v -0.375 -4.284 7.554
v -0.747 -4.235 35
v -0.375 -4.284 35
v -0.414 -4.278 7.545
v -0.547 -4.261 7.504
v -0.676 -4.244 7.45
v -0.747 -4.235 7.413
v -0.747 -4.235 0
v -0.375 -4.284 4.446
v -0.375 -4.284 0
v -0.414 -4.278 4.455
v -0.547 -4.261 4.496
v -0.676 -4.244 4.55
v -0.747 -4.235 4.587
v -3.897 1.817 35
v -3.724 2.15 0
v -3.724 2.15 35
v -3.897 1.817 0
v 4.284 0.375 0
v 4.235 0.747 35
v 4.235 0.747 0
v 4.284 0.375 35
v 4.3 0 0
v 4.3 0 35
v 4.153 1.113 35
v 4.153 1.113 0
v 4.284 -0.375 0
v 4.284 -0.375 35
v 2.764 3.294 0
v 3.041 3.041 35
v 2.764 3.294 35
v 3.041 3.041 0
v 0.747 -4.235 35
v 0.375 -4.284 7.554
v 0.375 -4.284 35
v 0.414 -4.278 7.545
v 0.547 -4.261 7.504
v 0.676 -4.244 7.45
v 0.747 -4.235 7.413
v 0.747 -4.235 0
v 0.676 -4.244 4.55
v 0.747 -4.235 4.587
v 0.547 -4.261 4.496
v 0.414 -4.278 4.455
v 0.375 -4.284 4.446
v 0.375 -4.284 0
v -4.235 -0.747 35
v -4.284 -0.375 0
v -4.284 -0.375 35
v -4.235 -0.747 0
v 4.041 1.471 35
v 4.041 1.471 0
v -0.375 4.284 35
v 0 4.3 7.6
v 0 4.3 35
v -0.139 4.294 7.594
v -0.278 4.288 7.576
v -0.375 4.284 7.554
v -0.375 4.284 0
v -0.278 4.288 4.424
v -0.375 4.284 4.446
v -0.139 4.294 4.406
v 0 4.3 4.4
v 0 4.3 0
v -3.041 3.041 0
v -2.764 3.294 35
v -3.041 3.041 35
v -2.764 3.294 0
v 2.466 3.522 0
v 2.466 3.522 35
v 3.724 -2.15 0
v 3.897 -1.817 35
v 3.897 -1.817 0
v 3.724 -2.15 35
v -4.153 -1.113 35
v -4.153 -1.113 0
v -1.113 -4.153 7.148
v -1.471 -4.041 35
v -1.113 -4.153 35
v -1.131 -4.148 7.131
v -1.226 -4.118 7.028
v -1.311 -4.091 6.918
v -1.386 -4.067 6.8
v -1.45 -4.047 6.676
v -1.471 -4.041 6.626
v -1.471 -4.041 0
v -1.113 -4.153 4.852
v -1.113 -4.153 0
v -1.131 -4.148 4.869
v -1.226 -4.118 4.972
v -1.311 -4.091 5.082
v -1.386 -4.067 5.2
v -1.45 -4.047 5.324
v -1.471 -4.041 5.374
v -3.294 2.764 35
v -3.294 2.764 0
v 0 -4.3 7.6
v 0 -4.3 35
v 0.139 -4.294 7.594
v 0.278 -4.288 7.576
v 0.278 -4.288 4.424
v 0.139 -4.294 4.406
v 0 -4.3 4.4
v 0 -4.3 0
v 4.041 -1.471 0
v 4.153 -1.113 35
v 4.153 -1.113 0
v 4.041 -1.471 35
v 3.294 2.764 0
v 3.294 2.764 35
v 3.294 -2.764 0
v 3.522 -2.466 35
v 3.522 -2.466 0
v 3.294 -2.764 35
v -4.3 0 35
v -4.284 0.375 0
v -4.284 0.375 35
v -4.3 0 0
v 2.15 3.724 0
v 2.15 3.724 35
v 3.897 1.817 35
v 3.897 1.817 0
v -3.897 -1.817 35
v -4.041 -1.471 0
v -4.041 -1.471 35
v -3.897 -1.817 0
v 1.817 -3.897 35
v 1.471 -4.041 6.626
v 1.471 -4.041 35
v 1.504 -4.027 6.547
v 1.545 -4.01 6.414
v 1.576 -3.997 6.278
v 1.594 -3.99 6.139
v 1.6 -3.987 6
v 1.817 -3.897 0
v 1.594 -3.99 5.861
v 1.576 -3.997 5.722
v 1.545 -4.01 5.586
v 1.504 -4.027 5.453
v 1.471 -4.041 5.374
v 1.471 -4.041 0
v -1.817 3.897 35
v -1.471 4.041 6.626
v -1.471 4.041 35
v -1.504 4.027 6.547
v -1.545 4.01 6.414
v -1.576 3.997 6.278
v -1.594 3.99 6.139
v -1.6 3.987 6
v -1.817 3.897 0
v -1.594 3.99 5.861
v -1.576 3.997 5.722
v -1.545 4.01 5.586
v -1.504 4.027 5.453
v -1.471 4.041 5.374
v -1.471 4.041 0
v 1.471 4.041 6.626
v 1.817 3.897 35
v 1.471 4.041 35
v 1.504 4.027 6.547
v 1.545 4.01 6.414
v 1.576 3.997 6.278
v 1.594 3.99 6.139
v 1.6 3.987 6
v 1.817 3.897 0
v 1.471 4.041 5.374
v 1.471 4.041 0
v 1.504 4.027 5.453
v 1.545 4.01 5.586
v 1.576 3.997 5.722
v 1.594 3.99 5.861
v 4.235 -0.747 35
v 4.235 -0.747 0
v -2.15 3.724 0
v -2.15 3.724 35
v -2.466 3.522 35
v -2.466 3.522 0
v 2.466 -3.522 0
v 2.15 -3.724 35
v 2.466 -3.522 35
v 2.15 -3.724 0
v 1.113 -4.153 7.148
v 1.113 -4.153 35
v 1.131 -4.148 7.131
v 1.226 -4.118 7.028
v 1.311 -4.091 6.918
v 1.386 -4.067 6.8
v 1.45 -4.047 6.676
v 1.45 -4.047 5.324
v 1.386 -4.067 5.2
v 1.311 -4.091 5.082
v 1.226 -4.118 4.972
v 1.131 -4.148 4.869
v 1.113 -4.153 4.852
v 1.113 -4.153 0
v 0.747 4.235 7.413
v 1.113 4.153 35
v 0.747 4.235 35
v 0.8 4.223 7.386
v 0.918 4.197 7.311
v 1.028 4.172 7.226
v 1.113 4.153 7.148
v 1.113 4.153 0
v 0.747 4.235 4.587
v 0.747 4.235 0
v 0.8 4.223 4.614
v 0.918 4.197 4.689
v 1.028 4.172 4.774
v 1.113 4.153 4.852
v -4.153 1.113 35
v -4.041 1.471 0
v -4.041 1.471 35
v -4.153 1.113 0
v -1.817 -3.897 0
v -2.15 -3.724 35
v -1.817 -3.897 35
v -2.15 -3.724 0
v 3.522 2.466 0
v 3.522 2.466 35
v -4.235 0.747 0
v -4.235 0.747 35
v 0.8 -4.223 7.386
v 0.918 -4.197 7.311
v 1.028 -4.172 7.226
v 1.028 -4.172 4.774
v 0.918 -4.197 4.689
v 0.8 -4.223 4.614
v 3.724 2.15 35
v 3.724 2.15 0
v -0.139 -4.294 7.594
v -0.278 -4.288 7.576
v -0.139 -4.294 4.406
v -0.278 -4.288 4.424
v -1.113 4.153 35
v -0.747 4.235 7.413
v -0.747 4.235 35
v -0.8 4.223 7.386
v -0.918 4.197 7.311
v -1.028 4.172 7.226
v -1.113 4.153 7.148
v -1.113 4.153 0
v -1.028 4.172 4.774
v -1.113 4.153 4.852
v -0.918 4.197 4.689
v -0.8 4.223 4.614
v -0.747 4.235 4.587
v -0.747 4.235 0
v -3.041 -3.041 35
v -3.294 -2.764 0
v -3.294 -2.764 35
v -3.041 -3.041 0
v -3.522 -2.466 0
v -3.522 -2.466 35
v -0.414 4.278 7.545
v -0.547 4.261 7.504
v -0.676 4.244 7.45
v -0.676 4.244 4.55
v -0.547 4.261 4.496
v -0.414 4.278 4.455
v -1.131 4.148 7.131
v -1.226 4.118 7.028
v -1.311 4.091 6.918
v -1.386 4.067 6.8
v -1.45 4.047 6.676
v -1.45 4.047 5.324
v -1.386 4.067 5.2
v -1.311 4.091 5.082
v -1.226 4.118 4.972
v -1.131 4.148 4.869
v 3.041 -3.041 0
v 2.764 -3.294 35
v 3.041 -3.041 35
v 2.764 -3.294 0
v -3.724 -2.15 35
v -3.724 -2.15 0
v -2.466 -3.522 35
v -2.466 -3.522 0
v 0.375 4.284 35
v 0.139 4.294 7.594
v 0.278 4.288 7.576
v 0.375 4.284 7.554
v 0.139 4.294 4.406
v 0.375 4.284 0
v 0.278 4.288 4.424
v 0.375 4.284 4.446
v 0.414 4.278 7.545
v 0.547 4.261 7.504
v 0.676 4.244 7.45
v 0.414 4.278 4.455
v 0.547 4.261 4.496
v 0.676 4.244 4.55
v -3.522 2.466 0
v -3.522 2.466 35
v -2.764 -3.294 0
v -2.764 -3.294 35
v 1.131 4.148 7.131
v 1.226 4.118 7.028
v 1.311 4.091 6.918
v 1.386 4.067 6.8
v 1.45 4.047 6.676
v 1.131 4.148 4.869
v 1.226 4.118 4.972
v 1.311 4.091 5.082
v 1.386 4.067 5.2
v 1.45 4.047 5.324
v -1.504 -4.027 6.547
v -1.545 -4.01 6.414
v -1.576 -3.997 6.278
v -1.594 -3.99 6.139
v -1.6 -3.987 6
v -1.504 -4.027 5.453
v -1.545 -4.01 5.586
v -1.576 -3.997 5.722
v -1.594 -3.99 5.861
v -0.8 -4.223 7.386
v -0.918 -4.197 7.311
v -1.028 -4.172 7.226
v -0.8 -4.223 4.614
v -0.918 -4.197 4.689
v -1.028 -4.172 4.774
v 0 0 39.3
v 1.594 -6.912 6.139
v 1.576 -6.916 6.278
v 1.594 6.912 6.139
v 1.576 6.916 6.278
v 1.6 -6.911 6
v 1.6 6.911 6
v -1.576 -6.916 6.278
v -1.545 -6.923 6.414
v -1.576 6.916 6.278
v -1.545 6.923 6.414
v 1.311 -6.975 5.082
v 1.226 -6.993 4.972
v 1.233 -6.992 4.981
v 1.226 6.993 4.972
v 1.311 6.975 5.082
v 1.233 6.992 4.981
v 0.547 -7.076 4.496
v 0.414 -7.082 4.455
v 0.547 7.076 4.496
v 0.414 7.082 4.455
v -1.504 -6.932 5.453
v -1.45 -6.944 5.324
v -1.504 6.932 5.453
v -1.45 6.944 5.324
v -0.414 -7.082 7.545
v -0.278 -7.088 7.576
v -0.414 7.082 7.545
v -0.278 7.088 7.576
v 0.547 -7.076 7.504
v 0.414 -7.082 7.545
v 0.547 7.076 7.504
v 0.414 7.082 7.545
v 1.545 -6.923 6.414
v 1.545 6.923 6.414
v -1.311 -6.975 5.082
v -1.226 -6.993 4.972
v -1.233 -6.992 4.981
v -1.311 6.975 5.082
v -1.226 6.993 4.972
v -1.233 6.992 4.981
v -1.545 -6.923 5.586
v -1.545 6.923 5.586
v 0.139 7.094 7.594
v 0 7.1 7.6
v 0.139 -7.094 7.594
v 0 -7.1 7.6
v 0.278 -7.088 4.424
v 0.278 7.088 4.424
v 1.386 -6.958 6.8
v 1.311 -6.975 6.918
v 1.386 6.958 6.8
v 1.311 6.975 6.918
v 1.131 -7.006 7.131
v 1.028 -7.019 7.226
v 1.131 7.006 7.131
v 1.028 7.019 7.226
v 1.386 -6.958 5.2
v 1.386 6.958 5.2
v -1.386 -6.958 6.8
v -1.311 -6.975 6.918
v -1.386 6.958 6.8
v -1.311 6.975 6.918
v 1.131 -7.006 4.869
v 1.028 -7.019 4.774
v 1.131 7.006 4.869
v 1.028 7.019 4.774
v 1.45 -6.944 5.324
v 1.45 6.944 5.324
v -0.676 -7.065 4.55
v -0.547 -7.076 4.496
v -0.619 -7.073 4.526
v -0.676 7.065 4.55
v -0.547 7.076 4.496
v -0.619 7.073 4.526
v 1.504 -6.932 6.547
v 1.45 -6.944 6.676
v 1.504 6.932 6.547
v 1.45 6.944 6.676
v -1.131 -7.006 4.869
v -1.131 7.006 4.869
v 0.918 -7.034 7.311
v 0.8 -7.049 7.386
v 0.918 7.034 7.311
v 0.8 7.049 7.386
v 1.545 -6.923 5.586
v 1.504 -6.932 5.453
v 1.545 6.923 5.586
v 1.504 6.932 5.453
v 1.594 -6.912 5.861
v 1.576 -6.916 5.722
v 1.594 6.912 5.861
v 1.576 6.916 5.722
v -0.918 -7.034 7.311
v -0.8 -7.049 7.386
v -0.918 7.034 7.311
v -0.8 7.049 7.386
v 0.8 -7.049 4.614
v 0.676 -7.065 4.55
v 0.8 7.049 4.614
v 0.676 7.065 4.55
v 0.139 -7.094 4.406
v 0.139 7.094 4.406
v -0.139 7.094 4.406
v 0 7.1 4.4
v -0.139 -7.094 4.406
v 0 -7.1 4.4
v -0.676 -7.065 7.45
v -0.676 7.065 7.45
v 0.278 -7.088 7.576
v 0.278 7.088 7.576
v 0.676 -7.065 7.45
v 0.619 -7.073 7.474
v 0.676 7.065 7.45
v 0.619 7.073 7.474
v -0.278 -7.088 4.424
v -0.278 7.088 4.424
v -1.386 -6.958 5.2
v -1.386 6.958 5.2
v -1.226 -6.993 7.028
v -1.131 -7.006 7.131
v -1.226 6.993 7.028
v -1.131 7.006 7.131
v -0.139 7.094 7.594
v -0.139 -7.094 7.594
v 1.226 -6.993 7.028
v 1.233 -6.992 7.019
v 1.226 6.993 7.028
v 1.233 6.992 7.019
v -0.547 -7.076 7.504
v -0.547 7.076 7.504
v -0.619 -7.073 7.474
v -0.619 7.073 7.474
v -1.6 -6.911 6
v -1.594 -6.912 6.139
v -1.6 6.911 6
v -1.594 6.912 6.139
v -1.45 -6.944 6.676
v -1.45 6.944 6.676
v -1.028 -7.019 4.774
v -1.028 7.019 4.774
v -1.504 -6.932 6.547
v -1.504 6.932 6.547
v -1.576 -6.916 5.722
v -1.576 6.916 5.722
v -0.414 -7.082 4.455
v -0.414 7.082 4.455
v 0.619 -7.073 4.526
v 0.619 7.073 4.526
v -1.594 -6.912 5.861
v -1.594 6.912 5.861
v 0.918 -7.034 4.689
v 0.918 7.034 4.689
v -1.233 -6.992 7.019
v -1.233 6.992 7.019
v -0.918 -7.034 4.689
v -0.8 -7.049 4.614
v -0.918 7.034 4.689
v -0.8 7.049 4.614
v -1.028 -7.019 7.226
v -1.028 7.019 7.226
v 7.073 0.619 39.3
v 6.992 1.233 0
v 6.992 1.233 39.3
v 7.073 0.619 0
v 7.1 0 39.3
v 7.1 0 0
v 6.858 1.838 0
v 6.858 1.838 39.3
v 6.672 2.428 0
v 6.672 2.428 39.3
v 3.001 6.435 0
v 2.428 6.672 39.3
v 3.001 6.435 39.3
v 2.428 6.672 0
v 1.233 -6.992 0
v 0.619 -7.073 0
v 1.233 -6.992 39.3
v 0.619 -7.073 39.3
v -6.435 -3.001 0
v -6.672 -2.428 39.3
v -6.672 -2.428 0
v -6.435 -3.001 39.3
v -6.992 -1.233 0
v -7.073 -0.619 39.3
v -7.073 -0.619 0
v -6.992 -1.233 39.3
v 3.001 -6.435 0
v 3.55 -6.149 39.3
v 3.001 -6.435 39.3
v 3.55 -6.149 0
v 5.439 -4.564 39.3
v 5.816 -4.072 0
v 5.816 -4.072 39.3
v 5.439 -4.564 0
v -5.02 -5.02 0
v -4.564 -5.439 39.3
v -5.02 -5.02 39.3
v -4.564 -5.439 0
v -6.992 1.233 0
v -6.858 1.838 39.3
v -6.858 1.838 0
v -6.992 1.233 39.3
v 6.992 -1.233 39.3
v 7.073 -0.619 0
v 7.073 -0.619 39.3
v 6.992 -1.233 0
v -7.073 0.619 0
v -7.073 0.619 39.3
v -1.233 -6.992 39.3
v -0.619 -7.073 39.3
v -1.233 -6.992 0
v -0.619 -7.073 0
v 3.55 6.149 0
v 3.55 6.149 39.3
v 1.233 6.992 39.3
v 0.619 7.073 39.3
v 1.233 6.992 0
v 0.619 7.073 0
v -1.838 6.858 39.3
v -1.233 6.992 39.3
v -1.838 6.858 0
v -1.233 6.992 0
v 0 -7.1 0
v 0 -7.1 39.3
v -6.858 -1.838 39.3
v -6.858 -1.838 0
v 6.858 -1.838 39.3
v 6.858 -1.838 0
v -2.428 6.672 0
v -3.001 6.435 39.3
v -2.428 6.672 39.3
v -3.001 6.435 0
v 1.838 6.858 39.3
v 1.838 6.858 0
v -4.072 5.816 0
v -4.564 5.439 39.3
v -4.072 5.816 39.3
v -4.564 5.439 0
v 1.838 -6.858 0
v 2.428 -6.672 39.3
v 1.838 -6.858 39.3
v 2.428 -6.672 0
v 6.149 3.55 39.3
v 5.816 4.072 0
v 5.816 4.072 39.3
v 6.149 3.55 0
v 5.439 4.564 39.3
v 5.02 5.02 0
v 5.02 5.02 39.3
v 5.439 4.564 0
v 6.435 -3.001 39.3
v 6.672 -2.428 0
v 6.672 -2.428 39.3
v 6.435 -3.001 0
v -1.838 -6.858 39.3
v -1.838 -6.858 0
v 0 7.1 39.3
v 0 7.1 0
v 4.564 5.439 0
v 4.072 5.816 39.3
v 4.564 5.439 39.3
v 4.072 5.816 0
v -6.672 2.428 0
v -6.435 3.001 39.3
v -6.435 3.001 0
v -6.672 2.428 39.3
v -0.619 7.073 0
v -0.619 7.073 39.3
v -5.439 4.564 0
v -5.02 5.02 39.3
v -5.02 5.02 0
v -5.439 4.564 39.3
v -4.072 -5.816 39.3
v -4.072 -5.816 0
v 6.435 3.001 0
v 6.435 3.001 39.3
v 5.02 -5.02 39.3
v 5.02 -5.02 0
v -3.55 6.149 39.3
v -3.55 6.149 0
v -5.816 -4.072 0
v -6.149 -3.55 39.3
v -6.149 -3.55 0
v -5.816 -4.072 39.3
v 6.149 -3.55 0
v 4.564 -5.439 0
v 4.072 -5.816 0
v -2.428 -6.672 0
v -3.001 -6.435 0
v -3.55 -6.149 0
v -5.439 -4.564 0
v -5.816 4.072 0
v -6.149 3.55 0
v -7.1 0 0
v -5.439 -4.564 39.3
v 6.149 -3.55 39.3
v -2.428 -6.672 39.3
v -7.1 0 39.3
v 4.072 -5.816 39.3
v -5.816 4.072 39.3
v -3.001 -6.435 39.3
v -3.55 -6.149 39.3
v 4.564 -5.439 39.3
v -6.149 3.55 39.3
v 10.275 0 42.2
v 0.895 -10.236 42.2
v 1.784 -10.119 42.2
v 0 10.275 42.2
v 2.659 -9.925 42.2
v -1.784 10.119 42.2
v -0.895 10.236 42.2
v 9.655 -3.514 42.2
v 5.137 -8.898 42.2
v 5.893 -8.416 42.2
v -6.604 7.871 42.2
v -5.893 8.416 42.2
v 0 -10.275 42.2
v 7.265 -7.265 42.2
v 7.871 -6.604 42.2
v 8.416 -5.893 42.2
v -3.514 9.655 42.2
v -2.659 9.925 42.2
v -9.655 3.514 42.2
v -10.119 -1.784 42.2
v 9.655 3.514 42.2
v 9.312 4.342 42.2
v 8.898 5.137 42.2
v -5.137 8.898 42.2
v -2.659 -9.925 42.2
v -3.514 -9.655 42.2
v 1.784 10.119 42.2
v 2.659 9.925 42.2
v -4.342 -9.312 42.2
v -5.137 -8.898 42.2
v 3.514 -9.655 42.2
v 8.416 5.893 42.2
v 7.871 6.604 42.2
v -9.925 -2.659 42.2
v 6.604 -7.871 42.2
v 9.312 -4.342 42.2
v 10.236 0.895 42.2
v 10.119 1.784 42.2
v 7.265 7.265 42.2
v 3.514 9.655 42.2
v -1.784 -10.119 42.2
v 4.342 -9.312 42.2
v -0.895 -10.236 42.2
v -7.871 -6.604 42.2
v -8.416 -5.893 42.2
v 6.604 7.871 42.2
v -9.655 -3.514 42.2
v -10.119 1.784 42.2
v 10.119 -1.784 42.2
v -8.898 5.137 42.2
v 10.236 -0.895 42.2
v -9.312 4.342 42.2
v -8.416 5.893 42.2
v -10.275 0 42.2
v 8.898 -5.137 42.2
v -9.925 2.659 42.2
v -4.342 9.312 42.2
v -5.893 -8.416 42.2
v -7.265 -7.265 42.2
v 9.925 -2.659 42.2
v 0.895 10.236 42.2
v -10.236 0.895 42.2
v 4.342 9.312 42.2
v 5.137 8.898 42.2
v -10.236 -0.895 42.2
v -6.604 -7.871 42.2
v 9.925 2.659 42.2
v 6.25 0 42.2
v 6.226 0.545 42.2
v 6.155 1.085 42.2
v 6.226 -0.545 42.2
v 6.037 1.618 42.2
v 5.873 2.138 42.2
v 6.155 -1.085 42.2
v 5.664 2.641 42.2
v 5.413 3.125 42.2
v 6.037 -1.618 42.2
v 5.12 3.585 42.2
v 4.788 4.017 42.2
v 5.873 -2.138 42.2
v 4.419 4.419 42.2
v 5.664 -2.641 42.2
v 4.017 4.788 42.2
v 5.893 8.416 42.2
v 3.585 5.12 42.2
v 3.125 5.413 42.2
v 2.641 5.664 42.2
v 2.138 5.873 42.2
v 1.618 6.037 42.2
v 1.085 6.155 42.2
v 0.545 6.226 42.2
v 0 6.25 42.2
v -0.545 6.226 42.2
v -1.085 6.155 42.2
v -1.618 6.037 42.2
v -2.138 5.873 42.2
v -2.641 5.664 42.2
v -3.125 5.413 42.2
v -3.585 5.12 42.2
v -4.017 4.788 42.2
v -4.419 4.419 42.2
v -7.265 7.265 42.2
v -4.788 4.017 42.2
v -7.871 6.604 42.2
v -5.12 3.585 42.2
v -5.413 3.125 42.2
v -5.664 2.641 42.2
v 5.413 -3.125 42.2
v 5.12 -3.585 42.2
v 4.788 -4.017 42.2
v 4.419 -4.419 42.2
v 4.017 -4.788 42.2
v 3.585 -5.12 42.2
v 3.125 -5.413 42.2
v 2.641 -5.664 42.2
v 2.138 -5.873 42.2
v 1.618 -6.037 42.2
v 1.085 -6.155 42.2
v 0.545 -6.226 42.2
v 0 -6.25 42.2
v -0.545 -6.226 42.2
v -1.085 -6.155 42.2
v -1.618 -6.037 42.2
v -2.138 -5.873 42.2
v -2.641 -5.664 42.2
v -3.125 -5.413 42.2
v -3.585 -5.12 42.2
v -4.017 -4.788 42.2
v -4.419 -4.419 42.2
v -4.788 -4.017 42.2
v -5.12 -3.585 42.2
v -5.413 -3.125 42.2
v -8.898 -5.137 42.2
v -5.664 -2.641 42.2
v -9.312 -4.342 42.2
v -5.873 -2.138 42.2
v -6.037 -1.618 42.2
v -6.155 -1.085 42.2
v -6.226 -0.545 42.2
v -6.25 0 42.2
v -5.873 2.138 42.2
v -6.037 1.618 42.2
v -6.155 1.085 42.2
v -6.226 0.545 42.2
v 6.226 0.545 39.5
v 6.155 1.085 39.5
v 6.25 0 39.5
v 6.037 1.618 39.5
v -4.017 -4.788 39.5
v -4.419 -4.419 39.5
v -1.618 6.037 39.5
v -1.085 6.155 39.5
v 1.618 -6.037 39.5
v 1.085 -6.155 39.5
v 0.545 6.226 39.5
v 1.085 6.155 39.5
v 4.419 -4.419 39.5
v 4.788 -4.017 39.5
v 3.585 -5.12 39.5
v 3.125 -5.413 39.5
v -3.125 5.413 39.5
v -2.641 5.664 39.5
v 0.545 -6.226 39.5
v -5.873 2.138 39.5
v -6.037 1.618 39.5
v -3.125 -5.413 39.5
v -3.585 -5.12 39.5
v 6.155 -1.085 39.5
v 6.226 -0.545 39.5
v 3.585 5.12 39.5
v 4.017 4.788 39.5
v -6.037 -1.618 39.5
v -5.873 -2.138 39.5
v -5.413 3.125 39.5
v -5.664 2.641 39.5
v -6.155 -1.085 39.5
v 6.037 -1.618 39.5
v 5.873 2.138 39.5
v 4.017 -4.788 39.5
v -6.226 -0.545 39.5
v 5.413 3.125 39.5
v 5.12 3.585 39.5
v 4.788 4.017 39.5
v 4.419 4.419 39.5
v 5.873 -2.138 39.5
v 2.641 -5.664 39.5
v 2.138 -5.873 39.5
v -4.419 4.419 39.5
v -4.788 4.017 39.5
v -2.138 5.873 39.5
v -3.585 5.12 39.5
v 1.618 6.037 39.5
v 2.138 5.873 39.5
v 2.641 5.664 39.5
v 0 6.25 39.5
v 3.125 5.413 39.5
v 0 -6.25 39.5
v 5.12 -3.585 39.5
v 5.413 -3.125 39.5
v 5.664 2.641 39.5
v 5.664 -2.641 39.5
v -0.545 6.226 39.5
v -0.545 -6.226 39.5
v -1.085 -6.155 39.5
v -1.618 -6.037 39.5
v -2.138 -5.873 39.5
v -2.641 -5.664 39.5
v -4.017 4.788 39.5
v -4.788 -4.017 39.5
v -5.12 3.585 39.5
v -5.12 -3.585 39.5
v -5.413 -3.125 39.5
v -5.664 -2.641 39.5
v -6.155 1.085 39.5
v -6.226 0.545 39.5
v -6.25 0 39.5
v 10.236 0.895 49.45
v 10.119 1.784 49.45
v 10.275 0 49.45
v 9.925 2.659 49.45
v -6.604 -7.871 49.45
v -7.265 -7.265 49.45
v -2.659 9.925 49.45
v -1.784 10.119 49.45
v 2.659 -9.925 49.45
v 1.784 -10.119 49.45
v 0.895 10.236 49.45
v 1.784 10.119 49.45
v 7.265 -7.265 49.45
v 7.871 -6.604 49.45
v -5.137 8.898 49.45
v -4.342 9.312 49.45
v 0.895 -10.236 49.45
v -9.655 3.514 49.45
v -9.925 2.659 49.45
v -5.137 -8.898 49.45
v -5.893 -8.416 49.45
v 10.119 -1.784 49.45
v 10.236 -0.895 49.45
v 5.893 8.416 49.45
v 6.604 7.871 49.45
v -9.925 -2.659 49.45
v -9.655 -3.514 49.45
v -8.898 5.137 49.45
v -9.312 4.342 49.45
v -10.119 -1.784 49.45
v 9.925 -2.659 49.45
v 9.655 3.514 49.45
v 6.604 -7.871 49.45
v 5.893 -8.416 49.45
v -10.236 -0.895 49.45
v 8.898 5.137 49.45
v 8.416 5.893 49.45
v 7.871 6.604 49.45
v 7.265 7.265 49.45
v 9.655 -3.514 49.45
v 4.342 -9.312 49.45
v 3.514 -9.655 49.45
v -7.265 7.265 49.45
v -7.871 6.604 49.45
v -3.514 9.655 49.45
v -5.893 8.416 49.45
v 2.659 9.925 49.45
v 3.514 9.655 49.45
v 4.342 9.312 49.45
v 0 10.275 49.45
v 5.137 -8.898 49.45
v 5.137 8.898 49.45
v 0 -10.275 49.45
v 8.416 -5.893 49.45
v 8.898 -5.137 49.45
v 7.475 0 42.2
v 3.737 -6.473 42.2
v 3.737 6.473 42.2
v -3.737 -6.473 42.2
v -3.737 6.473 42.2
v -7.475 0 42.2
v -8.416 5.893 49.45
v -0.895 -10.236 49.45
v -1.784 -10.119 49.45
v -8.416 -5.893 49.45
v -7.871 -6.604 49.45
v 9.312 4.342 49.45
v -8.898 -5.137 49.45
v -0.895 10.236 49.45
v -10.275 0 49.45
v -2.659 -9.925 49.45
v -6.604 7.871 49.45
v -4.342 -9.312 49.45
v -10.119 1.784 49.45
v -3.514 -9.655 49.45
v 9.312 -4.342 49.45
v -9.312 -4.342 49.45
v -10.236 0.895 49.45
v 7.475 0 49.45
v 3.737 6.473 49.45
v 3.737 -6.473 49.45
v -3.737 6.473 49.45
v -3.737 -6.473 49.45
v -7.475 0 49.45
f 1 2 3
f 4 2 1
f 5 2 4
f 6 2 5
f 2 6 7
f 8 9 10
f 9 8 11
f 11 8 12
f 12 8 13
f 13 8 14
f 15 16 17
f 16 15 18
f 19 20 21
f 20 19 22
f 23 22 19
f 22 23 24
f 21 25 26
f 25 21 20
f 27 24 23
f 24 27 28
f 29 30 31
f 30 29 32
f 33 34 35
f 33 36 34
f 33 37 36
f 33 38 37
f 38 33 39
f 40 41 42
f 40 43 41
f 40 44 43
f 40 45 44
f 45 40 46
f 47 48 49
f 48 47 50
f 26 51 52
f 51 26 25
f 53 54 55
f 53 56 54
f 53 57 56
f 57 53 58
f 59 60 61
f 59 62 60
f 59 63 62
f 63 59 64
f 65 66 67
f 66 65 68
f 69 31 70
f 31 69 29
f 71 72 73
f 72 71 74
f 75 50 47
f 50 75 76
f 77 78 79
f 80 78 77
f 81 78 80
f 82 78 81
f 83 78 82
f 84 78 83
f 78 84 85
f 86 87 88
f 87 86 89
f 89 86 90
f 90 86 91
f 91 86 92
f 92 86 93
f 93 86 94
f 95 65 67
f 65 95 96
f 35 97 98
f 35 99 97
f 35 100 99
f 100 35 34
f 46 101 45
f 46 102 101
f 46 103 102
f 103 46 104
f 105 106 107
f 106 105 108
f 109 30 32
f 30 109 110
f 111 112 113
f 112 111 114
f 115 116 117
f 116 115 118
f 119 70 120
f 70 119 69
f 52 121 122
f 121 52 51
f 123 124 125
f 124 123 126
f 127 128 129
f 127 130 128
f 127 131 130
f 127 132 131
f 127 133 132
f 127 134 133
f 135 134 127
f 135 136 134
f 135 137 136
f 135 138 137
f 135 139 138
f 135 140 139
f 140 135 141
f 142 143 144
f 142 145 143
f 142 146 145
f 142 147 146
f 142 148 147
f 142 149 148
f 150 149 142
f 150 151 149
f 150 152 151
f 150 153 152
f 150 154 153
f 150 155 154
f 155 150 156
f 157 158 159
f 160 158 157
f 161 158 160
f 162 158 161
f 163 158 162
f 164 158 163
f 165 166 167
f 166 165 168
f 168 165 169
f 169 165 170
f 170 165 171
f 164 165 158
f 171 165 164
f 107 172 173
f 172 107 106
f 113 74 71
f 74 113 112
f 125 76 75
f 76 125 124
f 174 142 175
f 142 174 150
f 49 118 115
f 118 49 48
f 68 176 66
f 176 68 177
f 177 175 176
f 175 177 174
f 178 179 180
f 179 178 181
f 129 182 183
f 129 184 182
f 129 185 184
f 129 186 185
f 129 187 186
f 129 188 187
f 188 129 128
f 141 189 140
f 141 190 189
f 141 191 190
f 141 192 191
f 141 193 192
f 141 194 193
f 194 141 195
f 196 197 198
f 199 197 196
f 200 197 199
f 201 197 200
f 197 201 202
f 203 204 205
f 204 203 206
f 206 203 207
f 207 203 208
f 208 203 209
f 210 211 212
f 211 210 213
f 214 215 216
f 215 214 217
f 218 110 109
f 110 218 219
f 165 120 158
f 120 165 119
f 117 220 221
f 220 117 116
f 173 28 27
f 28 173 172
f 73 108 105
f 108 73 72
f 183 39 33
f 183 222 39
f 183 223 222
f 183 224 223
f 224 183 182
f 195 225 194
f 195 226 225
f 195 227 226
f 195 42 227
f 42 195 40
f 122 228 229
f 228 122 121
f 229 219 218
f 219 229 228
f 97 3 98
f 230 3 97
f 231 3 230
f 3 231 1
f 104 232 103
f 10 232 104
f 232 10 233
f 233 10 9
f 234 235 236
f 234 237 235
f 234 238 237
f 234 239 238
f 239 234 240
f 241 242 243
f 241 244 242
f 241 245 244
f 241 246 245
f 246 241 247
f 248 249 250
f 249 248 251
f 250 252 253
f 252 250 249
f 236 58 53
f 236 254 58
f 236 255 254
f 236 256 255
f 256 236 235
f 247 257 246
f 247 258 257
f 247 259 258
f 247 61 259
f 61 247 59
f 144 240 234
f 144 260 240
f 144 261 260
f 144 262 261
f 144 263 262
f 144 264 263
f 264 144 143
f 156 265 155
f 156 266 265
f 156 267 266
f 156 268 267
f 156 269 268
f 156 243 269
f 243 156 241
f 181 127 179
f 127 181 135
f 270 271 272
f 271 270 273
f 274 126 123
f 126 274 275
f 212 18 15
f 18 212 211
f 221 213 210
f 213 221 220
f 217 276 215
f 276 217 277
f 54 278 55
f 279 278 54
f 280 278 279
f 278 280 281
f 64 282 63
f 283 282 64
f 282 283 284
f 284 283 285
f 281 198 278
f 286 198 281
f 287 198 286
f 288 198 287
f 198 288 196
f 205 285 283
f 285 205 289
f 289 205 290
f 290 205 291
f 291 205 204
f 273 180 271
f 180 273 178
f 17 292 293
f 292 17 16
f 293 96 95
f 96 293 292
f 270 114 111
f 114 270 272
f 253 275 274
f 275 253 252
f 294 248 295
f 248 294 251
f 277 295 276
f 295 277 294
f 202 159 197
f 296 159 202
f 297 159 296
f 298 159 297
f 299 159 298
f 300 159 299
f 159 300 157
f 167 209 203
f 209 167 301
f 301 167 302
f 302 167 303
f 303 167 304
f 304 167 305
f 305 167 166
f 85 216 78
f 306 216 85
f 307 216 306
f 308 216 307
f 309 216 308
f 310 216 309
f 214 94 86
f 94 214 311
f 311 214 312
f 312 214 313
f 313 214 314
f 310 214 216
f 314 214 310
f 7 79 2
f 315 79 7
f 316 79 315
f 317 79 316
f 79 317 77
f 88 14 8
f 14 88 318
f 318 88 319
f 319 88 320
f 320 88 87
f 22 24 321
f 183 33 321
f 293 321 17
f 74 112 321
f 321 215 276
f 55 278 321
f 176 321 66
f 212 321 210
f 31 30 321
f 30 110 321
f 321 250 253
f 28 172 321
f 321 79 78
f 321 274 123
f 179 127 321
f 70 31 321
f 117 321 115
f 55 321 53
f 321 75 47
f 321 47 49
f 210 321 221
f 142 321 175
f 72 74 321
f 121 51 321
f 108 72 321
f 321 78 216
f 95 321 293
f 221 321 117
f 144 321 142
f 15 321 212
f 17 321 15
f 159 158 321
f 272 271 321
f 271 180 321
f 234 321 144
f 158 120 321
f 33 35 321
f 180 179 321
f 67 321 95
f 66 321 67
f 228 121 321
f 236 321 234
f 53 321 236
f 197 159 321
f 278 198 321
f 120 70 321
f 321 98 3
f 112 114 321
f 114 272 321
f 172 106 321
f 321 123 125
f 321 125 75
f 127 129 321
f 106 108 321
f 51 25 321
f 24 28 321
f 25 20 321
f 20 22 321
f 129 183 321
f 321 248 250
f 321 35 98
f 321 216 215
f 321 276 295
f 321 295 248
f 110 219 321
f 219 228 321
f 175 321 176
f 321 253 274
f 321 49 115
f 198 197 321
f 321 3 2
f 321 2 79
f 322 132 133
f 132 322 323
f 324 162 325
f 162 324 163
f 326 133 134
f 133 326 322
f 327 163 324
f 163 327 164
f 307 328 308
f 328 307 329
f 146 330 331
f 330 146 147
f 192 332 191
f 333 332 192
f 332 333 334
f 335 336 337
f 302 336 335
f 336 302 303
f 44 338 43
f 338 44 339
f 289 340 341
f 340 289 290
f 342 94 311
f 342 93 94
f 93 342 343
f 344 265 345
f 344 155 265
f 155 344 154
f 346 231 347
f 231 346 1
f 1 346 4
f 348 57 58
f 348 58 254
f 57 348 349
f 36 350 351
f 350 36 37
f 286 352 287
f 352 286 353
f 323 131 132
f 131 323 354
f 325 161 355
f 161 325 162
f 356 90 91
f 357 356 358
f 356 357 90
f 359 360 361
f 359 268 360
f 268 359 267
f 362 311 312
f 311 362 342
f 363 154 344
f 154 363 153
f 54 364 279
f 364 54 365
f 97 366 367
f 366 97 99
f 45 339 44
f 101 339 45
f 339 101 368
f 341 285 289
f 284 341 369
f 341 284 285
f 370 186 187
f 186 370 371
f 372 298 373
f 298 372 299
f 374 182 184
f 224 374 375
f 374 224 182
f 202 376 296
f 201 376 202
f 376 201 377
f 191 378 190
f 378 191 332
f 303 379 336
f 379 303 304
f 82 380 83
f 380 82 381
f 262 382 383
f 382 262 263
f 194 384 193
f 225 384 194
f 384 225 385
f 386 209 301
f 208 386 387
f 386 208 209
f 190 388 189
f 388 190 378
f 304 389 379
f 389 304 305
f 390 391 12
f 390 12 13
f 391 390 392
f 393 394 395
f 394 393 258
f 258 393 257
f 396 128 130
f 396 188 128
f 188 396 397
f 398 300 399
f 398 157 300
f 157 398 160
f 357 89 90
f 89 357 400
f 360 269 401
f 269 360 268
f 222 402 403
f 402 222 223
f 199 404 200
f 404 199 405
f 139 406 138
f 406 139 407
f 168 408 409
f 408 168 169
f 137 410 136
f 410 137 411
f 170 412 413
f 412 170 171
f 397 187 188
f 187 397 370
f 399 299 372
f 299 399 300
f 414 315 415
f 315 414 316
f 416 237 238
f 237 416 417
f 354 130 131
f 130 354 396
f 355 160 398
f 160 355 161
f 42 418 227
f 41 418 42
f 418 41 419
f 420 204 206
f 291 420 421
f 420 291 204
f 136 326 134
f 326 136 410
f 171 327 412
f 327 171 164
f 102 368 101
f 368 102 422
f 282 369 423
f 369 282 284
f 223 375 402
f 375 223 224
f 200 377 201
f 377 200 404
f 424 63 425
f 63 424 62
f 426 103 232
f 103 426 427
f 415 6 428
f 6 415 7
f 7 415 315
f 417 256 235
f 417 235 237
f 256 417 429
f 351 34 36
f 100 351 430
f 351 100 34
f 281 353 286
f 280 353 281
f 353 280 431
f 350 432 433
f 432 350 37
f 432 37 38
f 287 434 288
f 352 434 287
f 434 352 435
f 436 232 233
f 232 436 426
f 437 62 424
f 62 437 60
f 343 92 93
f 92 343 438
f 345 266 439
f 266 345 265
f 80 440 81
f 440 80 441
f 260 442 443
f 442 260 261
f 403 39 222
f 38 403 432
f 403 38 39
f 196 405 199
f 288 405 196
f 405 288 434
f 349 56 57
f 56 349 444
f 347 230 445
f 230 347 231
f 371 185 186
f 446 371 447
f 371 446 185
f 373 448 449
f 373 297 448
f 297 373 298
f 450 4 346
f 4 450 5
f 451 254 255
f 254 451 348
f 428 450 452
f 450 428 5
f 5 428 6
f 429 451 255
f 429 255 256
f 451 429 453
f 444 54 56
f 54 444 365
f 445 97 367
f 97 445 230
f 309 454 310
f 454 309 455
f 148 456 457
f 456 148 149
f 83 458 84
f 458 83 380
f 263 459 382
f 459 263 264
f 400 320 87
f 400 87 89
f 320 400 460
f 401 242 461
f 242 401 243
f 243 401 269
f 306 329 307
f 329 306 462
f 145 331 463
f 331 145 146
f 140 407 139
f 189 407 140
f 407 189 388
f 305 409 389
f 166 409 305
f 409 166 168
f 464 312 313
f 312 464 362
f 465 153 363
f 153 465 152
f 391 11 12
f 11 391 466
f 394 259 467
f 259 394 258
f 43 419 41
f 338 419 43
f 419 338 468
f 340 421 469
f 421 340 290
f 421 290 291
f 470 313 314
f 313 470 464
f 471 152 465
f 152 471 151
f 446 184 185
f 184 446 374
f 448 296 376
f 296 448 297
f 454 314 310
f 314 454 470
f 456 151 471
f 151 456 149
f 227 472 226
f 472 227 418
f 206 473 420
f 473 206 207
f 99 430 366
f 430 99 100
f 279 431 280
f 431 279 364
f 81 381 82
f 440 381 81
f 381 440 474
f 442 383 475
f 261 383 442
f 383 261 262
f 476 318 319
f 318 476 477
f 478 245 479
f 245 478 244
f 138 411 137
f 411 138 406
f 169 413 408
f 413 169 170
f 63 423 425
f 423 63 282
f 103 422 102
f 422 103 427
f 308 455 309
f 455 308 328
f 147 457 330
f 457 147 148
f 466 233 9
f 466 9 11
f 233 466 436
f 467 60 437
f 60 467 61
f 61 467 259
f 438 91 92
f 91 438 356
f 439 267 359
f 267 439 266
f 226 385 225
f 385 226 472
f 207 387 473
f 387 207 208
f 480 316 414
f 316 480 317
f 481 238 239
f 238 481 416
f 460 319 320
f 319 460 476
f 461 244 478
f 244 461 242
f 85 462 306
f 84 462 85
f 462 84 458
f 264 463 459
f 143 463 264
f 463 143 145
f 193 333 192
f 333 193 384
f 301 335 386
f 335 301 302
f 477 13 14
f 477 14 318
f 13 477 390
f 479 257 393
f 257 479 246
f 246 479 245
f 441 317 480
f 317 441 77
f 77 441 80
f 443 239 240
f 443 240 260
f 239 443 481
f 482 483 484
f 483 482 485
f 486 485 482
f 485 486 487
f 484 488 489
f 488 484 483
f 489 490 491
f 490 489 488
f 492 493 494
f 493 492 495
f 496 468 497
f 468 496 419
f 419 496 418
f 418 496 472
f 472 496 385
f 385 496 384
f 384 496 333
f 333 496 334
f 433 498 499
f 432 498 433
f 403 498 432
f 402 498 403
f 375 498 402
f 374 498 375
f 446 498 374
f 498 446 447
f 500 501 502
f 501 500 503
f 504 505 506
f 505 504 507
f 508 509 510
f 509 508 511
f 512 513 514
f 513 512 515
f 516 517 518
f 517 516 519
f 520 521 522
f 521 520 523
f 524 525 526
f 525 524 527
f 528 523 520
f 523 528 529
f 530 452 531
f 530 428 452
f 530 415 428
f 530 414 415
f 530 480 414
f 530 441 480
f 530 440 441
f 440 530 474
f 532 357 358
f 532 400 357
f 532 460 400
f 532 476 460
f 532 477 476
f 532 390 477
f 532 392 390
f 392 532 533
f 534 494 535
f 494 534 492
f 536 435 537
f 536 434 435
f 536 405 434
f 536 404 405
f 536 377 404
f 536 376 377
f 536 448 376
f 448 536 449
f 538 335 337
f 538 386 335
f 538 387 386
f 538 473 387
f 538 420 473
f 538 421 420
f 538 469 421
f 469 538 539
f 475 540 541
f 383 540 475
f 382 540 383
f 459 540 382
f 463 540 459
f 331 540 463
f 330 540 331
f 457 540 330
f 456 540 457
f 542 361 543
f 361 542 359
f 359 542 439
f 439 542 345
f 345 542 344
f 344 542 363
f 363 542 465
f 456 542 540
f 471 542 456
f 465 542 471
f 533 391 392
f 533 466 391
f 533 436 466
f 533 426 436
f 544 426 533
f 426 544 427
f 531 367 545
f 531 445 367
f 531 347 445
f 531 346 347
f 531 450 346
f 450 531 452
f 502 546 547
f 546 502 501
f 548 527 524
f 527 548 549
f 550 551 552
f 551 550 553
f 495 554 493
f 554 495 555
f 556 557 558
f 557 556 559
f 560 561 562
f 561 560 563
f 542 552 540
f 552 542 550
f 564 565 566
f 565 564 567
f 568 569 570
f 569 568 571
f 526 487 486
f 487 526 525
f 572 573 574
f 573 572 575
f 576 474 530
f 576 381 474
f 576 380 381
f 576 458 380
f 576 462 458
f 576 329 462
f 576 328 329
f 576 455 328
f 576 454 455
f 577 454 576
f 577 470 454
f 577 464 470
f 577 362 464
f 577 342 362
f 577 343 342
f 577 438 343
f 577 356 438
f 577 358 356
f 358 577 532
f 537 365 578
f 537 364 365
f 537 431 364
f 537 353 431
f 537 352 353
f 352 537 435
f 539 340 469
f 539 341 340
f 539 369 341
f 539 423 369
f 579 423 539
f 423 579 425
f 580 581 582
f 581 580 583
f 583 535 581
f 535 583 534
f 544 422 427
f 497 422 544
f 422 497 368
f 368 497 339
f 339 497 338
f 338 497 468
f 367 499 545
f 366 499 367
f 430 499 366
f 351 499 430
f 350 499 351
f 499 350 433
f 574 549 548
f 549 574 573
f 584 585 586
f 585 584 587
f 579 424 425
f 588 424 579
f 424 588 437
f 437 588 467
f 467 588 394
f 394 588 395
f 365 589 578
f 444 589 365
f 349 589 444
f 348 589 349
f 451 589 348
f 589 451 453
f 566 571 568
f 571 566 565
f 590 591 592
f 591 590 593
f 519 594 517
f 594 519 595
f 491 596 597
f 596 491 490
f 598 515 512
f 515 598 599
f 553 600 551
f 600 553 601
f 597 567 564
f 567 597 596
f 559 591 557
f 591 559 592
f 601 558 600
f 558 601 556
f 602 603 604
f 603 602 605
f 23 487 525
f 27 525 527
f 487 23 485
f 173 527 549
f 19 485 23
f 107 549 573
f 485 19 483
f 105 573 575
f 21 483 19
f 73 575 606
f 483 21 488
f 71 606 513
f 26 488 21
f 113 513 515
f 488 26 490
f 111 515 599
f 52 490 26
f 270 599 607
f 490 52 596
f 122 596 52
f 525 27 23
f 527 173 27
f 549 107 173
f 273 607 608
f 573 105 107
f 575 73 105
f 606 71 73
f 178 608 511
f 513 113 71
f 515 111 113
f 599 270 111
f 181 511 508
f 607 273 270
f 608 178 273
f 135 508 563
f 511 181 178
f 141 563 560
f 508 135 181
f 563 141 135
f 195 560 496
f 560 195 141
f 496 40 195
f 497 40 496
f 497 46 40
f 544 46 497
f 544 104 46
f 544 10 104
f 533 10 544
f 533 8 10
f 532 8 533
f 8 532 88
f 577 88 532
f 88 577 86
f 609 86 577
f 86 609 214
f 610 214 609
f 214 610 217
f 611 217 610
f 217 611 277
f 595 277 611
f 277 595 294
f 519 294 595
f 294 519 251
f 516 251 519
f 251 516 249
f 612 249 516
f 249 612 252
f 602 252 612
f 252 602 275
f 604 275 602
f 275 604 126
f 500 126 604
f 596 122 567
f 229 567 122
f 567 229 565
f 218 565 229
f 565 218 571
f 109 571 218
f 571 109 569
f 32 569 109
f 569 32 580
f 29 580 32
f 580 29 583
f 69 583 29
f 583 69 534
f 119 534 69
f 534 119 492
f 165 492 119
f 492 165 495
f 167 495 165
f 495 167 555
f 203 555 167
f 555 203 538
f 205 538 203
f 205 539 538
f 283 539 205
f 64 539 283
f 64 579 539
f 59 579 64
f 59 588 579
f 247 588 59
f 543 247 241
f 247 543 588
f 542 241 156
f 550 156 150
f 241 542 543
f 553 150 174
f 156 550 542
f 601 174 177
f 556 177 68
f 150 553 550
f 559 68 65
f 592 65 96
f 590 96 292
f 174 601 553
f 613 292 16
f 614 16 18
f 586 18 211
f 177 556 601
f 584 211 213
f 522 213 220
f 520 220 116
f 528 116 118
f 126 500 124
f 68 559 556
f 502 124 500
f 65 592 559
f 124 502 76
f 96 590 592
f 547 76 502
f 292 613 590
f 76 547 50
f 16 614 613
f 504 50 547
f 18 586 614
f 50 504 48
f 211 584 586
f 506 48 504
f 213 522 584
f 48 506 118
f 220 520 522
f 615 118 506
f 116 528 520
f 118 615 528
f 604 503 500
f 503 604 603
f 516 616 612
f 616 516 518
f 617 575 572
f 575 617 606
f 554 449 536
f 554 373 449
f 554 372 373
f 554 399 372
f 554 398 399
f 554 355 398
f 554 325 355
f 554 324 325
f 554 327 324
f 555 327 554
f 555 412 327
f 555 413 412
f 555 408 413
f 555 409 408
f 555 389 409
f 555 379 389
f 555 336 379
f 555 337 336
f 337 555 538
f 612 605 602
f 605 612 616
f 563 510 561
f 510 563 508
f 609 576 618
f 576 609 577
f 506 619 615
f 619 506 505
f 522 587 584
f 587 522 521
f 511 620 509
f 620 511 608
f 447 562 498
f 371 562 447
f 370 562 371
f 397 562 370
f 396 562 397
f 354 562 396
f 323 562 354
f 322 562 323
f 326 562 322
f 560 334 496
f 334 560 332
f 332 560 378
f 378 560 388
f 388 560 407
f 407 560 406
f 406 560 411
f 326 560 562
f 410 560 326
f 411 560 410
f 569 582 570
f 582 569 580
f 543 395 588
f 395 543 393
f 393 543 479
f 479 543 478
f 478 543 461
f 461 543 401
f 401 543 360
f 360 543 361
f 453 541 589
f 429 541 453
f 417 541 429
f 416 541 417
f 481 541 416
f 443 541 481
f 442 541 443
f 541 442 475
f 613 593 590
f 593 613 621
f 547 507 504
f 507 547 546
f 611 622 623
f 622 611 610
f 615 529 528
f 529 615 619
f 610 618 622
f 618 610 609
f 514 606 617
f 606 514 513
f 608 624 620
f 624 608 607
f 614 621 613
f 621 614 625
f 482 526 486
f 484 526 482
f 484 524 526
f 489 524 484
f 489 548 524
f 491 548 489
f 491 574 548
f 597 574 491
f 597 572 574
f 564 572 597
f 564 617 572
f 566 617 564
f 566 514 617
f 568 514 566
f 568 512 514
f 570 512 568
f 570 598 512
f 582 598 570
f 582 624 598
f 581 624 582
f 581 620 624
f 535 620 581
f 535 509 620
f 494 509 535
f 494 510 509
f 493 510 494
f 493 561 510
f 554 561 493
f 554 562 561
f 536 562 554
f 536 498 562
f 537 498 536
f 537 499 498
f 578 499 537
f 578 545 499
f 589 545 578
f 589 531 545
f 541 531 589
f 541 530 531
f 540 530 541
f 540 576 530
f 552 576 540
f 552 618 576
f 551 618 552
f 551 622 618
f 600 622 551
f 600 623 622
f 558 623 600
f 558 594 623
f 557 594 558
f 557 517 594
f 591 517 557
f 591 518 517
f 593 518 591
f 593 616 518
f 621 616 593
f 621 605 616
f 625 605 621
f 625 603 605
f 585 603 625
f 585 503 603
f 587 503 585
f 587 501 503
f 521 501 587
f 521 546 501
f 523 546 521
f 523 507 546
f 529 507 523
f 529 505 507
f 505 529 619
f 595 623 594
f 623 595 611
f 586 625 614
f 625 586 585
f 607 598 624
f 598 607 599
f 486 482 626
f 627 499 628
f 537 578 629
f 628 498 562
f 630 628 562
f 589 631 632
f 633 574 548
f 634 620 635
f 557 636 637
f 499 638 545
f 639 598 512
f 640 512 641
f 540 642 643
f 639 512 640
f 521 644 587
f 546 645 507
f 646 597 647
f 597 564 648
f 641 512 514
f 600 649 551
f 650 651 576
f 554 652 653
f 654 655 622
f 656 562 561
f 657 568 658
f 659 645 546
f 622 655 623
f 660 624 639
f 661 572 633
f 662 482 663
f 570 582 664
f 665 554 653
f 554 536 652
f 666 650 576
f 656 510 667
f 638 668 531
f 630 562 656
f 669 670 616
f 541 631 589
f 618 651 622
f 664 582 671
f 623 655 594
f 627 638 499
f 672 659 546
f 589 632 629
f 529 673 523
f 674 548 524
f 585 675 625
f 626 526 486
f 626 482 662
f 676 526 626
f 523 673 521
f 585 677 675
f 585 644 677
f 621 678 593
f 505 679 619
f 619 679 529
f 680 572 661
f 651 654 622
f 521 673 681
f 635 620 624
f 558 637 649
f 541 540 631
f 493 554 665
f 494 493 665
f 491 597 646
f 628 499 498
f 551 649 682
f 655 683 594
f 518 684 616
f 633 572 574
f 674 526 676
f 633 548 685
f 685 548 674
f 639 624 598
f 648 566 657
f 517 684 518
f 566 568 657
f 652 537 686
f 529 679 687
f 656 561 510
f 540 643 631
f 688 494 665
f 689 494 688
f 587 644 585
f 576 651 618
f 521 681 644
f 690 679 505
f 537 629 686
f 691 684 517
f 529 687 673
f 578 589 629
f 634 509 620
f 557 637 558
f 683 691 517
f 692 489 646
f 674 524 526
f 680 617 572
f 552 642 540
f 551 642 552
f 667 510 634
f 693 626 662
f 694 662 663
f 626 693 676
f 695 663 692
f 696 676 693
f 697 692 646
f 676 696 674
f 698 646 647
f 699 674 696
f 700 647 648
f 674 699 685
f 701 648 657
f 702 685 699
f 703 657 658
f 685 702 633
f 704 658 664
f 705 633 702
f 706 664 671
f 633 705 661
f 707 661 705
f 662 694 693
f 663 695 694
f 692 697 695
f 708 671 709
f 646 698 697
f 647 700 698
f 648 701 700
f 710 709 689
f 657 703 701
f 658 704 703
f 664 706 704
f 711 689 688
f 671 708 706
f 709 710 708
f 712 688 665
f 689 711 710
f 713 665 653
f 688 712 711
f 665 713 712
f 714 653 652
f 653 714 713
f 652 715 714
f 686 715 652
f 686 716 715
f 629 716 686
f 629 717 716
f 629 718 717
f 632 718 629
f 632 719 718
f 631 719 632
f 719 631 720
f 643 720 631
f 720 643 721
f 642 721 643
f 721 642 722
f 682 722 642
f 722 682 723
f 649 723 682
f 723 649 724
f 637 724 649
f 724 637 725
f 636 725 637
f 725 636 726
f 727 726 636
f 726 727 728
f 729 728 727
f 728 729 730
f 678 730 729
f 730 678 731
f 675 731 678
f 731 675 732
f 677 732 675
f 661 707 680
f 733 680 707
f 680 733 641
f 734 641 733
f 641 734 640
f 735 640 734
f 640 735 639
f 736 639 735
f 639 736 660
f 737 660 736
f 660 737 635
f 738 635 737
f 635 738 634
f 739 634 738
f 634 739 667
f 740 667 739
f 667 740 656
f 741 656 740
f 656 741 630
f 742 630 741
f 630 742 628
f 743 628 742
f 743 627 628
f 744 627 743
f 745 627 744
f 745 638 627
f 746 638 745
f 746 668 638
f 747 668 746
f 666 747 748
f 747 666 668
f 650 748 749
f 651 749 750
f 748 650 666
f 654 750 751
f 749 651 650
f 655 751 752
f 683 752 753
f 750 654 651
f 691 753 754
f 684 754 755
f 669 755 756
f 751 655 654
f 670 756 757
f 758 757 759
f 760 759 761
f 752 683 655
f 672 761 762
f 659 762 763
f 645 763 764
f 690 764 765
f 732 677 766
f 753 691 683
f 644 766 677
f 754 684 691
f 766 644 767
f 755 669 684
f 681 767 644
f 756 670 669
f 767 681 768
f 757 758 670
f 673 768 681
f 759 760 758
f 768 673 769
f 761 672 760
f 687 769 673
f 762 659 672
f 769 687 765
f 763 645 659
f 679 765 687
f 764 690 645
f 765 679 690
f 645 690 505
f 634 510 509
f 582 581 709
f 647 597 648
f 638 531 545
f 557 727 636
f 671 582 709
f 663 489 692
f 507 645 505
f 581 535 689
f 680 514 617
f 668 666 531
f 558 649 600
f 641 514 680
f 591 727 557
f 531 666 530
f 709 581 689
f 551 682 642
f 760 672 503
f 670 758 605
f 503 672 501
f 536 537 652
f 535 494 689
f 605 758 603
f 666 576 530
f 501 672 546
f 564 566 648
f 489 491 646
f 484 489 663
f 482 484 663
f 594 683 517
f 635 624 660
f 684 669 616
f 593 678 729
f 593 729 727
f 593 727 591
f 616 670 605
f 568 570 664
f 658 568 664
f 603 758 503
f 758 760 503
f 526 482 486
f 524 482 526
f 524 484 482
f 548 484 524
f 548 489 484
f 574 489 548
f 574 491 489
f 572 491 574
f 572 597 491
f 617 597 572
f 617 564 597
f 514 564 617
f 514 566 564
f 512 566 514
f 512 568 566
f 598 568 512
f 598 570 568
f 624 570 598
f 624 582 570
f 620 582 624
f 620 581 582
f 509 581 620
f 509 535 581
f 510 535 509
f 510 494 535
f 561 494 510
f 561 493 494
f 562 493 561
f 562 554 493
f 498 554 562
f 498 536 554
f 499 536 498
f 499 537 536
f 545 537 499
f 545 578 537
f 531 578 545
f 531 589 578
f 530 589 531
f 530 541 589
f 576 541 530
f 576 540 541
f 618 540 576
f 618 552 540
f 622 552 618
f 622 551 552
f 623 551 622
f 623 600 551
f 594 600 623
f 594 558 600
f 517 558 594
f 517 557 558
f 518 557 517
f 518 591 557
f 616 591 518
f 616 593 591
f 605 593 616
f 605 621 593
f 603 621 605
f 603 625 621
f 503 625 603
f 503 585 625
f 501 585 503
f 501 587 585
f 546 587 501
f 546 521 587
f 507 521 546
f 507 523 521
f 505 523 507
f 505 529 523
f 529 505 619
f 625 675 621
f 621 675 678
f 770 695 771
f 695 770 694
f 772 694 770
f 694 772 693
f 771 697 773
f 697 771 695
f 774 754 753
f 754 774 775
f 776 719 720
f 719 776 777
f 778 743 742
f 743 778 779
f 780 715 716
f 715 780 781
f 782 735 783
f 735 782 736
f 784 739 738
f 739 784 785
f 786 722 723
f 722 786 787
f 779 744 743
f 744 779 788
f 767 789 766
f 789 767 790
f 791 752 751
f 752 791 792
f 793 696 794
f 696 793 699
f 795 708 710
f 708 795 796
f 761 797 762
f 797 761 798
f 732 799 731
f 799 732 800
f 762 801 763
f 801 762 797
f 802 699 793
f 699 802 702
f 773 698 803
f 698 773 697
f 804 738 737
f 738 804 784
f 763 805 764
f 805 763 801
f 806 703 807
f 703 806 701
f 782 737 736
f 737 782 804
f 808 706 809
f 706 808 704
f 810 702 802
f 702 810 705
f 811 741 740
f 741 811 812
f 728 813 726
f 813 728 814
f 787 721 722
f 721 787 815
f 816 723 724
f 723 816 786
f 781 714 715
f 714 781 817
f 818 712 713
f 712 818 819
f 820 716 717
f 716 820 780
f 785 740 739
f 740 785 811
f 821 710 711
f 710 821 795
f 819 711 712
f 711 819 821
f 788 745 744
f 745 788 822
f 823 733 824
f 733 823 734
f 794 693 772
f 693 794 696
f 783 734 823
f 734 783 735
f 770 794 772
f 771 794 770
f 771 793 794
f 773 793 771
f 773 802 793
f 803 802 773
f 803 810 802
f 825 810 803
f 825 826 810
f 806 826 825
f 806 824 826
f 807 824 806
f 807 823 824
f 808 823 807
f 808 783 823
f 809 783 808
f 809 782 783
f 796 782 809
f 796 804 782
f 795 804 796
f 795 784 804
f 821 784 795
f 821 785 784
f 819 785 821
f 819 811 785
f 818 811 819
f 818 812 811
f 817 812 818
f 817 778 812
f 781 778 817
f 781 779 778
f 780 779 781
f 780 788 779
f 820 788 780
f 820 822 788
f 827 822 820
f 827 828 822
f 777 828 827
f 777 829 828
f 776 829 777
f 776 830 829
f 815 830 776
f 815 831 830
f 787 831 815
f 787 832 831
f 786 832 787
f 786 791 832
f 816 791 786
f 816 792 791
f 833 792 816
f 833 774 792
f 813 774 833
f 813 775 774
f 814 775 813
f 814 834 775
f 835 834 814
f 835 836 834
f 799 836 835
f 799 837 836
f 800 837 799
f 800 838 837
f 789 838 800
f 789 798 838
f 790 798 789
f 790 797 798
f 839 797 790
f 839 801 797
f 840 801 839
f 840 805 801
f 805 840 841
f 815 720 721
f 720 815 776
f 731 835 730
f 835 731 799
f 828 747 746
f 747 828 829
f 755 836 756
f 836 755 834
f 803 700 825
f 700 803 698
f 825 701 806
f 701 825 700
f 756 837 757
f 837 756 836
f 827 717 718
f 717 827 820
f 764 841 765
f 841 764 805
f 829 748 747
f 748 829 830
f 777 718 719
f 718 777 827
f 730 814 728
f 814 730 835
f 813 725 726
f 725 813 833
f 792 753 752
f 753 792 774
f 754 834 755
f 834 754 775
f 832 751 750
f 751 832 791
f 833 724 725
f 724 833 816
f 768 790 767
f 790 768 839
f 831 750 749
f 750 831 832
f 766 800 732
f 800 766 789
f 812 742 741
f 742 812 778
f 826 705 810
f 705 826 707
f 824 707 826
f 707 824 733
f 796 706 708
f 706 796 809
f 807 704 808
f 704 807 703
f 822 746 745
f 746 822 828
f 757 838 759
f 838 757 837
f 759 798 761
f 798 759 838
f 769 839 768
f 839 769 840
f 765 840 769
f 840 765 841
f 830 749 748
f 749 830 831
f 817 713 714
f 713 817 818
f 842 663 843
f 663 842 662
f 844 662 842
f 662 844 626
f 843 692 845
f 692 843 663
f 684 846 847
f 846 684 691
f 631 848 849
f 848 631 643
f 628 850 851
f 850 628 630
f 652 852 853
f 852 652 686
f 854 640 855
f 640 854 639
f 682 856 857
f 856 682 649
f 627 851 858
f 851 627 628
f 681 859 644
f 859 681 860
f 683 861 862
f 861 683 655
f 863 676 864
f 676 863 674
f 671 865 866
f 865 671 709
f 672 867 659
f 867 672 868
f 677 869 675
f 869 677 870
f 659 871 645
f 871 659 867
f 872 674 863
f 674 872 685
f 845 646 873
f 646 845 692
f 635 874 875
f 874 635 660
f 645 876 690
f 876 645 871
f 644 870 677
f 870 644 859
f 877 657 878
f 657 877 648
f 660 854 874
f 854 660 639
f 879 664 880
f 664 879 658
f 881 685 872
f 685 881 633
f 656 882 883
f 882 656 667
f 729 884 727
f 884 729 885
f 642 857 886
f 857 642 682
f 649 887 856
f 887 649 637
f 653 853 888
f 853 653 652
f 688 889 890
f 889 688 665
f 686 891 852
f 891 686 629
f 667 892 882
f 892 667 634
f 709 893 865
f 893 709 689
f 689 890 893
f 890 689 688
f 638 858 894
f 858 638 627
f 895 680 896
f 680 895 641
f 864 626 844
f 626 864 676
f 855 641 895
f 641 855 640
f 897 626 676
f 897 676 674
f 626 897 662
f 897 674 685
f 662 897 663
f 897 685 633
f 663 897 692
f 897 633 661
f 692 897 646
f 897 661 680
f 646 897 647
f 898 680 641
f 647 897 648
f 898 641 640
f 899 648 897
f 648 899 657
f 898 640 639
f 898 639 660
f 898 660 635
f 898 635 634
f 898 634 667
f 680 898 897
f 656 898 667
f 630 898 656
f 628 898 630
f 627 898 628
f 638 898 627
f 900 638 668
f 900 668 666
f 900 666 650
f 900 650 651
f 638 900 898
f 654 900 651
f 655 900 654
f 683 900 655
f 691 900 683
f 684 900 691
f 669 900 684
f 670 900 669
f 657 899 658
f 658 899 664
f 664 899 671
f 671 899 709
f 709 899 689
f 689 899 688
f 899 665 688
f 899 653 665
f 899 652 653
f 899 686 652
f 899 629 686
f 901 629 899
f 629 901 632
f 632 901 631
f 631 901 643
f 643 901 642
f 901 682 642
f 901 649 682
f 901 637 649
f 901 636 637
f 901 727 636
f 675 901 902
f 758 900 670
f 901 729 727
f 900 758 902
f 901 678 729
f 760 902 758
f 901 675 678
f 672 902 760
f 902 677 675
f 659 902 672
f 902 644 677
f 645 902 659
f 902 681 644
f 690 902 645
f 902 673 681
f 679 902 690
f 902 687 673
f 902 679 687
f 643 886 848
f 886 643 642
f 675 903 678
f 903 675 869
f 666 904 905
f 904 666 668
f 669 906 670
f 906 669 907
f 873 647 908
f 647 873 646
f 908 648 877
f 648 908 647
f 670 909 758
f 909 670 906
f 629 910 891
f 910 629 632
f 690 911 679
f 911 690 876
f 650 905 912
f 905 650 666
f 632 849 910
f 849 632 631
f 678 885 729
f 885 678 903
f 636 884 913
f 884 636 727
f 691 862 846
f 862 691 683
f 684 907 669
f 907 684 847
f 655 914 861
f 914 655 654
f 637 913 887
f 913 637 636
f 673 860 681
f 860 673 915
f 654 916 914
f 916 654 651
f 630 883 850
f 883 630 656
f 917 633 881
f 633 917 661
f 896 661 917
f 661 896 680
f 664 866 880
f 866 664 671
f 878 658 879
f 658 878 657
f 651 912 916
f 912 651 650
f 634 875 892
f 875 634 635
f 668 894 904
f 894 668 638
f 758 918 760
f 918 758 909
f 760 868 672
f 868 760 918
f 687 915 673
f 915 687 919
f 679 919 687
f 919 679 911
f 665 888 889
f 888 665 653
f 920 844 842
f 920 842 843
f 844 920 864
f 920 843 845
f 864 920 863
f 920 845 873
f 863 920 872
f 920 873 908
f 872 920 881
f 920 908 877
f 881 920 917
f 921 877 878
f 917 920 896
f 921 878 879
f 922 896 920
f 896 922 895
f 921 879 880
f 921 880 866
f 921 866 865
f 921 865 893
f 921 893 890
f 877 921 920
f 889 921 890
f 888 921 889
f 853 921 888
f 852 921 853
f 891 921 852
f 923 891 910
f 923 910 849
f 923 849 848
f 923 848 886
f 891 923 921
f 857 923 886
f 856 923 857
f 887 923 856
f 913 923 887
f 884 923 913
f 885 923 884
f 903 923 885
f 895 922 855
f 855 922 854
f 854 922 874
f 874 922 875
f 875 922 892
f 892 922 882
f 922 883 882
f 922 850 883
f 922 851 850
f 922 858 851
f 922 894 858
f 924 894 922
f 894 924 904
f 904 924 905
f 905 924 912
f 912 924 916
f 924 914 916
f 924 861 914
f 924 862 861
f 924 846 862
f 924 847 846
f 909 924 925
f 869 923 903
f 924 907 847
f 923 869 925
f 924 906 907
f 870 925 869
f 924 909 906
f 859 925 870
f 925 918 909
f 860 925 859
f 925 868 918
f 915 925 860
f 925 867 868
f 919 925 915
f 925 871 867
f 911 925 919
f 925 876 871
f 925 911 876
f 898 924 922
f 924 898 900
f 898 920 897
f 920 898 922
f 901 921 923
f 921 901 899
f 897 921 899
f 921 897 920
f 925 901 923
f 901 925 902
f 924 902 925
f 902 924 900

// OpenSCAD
Gap = 0.2;
$fn = 72;

RodToMotorCoupling(true);

// TODO: rename to RodCoupling. Parameter indicates whether we couple to motor or bearing
module RodToMotorCoupling(motorConnection) {
    Padding = 3.0;
    
    // Determine what kind of "bearing" this is
    // This is related to the motor. Probably the outside of the total shaft
    BearingDiameter = 20.0;
    BearingHeight = 14.0;

    // And that's for the actual bearing
    // BearingDiameter = 8;
    // BearingHeight = 12;
        
    HexFlatDiameter = 12.60;
    HexRadius = HexFlatDiameter/(2 * cos(30));
    HexHeight = 4.50;
    StopperDiameter = 12.50;
    StopperHeight = 2.75;

    TopRadius = HexRadius + Padding;
    TopHeight = HexHeight + StopperHeight;
    
    ShaftDiameter = 8.2;
    SocketThickness = 3.0;
    ShaftHeight = 35.0;

    GuideHeight = 6.0;
    GuideDiameter = 2.8;
    
    ShaftRadius = ShaftDiameter / 2;
    SocketRadius = ShaftRadius + SocketThickness;
    SocketDiameter = SocketRadius * 2;
    BearingRadius = BearingDiameter / 2;
    MiddleHeight = BearingRadius - SocketRadius; // ensure angle of 45 degrees on the outer wall
    GuideRadius = GuideDiameter / 2;
    MiddleInnerHeight = ShaftRadius + Gap; // ensure angle of 45 degrees on the inner wall

    TotalShaftHeight = motorConnection ? ShaftHeight + MiddleInnerHeight : BearingHeight;
    TotalShaftRadius = motorConnection ? SocketRadius : BearingRadius;

    union () {
        // Part which wraps around the motor
        difference() {
            cylinder(r=TotalShaftRadius, h = TotalShaftHeight);

            // When connecting to the motor, hollow out the shaft and a guide screw
            if (motorConnection)
            {
                translate([0,TotalShaftRadius,GuideHeight])
                    rotate([90,0,0])
                        cylinder(r=GuideRadius + Gap, h = SocketDiameter);

                translate([0,0,-1]) // -1 to Ensure the difference
                    union()
                    {
                        cylinder(r=ShaftRadius + Gap, h = ShaftHeight+1);
                        translate([0,0,ShaftHeight + 1])
                            cylinder(r1=ShaftRadius + Gap, r2= 0, h = MiddleInnerHeight);
                    }
            }
        }

        // Connection between the two parts
        translate([0,0,TotalShaftHeight])
            difference() {
                // Outside connection
                cylinder(r1=TotalShaftRadius, r2= TopRadius, h = MiddleHeight);
                // hollow dome with 45 degree roof
                translate([0,0,Gap])
                    cylinder(r=StopperDiameter / 2, h = StopperHeight);
            }
        
        // Part which hosts the hex stopper
        translate([0,0, TotalShaftHeight + MiddleHeight])
            difference() {
                cylinder(r=TopRadius, h = TopHeight);

                translate([0,0,0])
                    cylinder(r = HexRadius + Gap, h = TopHeight + Gap, $fn = 6);
            }
    }
}
